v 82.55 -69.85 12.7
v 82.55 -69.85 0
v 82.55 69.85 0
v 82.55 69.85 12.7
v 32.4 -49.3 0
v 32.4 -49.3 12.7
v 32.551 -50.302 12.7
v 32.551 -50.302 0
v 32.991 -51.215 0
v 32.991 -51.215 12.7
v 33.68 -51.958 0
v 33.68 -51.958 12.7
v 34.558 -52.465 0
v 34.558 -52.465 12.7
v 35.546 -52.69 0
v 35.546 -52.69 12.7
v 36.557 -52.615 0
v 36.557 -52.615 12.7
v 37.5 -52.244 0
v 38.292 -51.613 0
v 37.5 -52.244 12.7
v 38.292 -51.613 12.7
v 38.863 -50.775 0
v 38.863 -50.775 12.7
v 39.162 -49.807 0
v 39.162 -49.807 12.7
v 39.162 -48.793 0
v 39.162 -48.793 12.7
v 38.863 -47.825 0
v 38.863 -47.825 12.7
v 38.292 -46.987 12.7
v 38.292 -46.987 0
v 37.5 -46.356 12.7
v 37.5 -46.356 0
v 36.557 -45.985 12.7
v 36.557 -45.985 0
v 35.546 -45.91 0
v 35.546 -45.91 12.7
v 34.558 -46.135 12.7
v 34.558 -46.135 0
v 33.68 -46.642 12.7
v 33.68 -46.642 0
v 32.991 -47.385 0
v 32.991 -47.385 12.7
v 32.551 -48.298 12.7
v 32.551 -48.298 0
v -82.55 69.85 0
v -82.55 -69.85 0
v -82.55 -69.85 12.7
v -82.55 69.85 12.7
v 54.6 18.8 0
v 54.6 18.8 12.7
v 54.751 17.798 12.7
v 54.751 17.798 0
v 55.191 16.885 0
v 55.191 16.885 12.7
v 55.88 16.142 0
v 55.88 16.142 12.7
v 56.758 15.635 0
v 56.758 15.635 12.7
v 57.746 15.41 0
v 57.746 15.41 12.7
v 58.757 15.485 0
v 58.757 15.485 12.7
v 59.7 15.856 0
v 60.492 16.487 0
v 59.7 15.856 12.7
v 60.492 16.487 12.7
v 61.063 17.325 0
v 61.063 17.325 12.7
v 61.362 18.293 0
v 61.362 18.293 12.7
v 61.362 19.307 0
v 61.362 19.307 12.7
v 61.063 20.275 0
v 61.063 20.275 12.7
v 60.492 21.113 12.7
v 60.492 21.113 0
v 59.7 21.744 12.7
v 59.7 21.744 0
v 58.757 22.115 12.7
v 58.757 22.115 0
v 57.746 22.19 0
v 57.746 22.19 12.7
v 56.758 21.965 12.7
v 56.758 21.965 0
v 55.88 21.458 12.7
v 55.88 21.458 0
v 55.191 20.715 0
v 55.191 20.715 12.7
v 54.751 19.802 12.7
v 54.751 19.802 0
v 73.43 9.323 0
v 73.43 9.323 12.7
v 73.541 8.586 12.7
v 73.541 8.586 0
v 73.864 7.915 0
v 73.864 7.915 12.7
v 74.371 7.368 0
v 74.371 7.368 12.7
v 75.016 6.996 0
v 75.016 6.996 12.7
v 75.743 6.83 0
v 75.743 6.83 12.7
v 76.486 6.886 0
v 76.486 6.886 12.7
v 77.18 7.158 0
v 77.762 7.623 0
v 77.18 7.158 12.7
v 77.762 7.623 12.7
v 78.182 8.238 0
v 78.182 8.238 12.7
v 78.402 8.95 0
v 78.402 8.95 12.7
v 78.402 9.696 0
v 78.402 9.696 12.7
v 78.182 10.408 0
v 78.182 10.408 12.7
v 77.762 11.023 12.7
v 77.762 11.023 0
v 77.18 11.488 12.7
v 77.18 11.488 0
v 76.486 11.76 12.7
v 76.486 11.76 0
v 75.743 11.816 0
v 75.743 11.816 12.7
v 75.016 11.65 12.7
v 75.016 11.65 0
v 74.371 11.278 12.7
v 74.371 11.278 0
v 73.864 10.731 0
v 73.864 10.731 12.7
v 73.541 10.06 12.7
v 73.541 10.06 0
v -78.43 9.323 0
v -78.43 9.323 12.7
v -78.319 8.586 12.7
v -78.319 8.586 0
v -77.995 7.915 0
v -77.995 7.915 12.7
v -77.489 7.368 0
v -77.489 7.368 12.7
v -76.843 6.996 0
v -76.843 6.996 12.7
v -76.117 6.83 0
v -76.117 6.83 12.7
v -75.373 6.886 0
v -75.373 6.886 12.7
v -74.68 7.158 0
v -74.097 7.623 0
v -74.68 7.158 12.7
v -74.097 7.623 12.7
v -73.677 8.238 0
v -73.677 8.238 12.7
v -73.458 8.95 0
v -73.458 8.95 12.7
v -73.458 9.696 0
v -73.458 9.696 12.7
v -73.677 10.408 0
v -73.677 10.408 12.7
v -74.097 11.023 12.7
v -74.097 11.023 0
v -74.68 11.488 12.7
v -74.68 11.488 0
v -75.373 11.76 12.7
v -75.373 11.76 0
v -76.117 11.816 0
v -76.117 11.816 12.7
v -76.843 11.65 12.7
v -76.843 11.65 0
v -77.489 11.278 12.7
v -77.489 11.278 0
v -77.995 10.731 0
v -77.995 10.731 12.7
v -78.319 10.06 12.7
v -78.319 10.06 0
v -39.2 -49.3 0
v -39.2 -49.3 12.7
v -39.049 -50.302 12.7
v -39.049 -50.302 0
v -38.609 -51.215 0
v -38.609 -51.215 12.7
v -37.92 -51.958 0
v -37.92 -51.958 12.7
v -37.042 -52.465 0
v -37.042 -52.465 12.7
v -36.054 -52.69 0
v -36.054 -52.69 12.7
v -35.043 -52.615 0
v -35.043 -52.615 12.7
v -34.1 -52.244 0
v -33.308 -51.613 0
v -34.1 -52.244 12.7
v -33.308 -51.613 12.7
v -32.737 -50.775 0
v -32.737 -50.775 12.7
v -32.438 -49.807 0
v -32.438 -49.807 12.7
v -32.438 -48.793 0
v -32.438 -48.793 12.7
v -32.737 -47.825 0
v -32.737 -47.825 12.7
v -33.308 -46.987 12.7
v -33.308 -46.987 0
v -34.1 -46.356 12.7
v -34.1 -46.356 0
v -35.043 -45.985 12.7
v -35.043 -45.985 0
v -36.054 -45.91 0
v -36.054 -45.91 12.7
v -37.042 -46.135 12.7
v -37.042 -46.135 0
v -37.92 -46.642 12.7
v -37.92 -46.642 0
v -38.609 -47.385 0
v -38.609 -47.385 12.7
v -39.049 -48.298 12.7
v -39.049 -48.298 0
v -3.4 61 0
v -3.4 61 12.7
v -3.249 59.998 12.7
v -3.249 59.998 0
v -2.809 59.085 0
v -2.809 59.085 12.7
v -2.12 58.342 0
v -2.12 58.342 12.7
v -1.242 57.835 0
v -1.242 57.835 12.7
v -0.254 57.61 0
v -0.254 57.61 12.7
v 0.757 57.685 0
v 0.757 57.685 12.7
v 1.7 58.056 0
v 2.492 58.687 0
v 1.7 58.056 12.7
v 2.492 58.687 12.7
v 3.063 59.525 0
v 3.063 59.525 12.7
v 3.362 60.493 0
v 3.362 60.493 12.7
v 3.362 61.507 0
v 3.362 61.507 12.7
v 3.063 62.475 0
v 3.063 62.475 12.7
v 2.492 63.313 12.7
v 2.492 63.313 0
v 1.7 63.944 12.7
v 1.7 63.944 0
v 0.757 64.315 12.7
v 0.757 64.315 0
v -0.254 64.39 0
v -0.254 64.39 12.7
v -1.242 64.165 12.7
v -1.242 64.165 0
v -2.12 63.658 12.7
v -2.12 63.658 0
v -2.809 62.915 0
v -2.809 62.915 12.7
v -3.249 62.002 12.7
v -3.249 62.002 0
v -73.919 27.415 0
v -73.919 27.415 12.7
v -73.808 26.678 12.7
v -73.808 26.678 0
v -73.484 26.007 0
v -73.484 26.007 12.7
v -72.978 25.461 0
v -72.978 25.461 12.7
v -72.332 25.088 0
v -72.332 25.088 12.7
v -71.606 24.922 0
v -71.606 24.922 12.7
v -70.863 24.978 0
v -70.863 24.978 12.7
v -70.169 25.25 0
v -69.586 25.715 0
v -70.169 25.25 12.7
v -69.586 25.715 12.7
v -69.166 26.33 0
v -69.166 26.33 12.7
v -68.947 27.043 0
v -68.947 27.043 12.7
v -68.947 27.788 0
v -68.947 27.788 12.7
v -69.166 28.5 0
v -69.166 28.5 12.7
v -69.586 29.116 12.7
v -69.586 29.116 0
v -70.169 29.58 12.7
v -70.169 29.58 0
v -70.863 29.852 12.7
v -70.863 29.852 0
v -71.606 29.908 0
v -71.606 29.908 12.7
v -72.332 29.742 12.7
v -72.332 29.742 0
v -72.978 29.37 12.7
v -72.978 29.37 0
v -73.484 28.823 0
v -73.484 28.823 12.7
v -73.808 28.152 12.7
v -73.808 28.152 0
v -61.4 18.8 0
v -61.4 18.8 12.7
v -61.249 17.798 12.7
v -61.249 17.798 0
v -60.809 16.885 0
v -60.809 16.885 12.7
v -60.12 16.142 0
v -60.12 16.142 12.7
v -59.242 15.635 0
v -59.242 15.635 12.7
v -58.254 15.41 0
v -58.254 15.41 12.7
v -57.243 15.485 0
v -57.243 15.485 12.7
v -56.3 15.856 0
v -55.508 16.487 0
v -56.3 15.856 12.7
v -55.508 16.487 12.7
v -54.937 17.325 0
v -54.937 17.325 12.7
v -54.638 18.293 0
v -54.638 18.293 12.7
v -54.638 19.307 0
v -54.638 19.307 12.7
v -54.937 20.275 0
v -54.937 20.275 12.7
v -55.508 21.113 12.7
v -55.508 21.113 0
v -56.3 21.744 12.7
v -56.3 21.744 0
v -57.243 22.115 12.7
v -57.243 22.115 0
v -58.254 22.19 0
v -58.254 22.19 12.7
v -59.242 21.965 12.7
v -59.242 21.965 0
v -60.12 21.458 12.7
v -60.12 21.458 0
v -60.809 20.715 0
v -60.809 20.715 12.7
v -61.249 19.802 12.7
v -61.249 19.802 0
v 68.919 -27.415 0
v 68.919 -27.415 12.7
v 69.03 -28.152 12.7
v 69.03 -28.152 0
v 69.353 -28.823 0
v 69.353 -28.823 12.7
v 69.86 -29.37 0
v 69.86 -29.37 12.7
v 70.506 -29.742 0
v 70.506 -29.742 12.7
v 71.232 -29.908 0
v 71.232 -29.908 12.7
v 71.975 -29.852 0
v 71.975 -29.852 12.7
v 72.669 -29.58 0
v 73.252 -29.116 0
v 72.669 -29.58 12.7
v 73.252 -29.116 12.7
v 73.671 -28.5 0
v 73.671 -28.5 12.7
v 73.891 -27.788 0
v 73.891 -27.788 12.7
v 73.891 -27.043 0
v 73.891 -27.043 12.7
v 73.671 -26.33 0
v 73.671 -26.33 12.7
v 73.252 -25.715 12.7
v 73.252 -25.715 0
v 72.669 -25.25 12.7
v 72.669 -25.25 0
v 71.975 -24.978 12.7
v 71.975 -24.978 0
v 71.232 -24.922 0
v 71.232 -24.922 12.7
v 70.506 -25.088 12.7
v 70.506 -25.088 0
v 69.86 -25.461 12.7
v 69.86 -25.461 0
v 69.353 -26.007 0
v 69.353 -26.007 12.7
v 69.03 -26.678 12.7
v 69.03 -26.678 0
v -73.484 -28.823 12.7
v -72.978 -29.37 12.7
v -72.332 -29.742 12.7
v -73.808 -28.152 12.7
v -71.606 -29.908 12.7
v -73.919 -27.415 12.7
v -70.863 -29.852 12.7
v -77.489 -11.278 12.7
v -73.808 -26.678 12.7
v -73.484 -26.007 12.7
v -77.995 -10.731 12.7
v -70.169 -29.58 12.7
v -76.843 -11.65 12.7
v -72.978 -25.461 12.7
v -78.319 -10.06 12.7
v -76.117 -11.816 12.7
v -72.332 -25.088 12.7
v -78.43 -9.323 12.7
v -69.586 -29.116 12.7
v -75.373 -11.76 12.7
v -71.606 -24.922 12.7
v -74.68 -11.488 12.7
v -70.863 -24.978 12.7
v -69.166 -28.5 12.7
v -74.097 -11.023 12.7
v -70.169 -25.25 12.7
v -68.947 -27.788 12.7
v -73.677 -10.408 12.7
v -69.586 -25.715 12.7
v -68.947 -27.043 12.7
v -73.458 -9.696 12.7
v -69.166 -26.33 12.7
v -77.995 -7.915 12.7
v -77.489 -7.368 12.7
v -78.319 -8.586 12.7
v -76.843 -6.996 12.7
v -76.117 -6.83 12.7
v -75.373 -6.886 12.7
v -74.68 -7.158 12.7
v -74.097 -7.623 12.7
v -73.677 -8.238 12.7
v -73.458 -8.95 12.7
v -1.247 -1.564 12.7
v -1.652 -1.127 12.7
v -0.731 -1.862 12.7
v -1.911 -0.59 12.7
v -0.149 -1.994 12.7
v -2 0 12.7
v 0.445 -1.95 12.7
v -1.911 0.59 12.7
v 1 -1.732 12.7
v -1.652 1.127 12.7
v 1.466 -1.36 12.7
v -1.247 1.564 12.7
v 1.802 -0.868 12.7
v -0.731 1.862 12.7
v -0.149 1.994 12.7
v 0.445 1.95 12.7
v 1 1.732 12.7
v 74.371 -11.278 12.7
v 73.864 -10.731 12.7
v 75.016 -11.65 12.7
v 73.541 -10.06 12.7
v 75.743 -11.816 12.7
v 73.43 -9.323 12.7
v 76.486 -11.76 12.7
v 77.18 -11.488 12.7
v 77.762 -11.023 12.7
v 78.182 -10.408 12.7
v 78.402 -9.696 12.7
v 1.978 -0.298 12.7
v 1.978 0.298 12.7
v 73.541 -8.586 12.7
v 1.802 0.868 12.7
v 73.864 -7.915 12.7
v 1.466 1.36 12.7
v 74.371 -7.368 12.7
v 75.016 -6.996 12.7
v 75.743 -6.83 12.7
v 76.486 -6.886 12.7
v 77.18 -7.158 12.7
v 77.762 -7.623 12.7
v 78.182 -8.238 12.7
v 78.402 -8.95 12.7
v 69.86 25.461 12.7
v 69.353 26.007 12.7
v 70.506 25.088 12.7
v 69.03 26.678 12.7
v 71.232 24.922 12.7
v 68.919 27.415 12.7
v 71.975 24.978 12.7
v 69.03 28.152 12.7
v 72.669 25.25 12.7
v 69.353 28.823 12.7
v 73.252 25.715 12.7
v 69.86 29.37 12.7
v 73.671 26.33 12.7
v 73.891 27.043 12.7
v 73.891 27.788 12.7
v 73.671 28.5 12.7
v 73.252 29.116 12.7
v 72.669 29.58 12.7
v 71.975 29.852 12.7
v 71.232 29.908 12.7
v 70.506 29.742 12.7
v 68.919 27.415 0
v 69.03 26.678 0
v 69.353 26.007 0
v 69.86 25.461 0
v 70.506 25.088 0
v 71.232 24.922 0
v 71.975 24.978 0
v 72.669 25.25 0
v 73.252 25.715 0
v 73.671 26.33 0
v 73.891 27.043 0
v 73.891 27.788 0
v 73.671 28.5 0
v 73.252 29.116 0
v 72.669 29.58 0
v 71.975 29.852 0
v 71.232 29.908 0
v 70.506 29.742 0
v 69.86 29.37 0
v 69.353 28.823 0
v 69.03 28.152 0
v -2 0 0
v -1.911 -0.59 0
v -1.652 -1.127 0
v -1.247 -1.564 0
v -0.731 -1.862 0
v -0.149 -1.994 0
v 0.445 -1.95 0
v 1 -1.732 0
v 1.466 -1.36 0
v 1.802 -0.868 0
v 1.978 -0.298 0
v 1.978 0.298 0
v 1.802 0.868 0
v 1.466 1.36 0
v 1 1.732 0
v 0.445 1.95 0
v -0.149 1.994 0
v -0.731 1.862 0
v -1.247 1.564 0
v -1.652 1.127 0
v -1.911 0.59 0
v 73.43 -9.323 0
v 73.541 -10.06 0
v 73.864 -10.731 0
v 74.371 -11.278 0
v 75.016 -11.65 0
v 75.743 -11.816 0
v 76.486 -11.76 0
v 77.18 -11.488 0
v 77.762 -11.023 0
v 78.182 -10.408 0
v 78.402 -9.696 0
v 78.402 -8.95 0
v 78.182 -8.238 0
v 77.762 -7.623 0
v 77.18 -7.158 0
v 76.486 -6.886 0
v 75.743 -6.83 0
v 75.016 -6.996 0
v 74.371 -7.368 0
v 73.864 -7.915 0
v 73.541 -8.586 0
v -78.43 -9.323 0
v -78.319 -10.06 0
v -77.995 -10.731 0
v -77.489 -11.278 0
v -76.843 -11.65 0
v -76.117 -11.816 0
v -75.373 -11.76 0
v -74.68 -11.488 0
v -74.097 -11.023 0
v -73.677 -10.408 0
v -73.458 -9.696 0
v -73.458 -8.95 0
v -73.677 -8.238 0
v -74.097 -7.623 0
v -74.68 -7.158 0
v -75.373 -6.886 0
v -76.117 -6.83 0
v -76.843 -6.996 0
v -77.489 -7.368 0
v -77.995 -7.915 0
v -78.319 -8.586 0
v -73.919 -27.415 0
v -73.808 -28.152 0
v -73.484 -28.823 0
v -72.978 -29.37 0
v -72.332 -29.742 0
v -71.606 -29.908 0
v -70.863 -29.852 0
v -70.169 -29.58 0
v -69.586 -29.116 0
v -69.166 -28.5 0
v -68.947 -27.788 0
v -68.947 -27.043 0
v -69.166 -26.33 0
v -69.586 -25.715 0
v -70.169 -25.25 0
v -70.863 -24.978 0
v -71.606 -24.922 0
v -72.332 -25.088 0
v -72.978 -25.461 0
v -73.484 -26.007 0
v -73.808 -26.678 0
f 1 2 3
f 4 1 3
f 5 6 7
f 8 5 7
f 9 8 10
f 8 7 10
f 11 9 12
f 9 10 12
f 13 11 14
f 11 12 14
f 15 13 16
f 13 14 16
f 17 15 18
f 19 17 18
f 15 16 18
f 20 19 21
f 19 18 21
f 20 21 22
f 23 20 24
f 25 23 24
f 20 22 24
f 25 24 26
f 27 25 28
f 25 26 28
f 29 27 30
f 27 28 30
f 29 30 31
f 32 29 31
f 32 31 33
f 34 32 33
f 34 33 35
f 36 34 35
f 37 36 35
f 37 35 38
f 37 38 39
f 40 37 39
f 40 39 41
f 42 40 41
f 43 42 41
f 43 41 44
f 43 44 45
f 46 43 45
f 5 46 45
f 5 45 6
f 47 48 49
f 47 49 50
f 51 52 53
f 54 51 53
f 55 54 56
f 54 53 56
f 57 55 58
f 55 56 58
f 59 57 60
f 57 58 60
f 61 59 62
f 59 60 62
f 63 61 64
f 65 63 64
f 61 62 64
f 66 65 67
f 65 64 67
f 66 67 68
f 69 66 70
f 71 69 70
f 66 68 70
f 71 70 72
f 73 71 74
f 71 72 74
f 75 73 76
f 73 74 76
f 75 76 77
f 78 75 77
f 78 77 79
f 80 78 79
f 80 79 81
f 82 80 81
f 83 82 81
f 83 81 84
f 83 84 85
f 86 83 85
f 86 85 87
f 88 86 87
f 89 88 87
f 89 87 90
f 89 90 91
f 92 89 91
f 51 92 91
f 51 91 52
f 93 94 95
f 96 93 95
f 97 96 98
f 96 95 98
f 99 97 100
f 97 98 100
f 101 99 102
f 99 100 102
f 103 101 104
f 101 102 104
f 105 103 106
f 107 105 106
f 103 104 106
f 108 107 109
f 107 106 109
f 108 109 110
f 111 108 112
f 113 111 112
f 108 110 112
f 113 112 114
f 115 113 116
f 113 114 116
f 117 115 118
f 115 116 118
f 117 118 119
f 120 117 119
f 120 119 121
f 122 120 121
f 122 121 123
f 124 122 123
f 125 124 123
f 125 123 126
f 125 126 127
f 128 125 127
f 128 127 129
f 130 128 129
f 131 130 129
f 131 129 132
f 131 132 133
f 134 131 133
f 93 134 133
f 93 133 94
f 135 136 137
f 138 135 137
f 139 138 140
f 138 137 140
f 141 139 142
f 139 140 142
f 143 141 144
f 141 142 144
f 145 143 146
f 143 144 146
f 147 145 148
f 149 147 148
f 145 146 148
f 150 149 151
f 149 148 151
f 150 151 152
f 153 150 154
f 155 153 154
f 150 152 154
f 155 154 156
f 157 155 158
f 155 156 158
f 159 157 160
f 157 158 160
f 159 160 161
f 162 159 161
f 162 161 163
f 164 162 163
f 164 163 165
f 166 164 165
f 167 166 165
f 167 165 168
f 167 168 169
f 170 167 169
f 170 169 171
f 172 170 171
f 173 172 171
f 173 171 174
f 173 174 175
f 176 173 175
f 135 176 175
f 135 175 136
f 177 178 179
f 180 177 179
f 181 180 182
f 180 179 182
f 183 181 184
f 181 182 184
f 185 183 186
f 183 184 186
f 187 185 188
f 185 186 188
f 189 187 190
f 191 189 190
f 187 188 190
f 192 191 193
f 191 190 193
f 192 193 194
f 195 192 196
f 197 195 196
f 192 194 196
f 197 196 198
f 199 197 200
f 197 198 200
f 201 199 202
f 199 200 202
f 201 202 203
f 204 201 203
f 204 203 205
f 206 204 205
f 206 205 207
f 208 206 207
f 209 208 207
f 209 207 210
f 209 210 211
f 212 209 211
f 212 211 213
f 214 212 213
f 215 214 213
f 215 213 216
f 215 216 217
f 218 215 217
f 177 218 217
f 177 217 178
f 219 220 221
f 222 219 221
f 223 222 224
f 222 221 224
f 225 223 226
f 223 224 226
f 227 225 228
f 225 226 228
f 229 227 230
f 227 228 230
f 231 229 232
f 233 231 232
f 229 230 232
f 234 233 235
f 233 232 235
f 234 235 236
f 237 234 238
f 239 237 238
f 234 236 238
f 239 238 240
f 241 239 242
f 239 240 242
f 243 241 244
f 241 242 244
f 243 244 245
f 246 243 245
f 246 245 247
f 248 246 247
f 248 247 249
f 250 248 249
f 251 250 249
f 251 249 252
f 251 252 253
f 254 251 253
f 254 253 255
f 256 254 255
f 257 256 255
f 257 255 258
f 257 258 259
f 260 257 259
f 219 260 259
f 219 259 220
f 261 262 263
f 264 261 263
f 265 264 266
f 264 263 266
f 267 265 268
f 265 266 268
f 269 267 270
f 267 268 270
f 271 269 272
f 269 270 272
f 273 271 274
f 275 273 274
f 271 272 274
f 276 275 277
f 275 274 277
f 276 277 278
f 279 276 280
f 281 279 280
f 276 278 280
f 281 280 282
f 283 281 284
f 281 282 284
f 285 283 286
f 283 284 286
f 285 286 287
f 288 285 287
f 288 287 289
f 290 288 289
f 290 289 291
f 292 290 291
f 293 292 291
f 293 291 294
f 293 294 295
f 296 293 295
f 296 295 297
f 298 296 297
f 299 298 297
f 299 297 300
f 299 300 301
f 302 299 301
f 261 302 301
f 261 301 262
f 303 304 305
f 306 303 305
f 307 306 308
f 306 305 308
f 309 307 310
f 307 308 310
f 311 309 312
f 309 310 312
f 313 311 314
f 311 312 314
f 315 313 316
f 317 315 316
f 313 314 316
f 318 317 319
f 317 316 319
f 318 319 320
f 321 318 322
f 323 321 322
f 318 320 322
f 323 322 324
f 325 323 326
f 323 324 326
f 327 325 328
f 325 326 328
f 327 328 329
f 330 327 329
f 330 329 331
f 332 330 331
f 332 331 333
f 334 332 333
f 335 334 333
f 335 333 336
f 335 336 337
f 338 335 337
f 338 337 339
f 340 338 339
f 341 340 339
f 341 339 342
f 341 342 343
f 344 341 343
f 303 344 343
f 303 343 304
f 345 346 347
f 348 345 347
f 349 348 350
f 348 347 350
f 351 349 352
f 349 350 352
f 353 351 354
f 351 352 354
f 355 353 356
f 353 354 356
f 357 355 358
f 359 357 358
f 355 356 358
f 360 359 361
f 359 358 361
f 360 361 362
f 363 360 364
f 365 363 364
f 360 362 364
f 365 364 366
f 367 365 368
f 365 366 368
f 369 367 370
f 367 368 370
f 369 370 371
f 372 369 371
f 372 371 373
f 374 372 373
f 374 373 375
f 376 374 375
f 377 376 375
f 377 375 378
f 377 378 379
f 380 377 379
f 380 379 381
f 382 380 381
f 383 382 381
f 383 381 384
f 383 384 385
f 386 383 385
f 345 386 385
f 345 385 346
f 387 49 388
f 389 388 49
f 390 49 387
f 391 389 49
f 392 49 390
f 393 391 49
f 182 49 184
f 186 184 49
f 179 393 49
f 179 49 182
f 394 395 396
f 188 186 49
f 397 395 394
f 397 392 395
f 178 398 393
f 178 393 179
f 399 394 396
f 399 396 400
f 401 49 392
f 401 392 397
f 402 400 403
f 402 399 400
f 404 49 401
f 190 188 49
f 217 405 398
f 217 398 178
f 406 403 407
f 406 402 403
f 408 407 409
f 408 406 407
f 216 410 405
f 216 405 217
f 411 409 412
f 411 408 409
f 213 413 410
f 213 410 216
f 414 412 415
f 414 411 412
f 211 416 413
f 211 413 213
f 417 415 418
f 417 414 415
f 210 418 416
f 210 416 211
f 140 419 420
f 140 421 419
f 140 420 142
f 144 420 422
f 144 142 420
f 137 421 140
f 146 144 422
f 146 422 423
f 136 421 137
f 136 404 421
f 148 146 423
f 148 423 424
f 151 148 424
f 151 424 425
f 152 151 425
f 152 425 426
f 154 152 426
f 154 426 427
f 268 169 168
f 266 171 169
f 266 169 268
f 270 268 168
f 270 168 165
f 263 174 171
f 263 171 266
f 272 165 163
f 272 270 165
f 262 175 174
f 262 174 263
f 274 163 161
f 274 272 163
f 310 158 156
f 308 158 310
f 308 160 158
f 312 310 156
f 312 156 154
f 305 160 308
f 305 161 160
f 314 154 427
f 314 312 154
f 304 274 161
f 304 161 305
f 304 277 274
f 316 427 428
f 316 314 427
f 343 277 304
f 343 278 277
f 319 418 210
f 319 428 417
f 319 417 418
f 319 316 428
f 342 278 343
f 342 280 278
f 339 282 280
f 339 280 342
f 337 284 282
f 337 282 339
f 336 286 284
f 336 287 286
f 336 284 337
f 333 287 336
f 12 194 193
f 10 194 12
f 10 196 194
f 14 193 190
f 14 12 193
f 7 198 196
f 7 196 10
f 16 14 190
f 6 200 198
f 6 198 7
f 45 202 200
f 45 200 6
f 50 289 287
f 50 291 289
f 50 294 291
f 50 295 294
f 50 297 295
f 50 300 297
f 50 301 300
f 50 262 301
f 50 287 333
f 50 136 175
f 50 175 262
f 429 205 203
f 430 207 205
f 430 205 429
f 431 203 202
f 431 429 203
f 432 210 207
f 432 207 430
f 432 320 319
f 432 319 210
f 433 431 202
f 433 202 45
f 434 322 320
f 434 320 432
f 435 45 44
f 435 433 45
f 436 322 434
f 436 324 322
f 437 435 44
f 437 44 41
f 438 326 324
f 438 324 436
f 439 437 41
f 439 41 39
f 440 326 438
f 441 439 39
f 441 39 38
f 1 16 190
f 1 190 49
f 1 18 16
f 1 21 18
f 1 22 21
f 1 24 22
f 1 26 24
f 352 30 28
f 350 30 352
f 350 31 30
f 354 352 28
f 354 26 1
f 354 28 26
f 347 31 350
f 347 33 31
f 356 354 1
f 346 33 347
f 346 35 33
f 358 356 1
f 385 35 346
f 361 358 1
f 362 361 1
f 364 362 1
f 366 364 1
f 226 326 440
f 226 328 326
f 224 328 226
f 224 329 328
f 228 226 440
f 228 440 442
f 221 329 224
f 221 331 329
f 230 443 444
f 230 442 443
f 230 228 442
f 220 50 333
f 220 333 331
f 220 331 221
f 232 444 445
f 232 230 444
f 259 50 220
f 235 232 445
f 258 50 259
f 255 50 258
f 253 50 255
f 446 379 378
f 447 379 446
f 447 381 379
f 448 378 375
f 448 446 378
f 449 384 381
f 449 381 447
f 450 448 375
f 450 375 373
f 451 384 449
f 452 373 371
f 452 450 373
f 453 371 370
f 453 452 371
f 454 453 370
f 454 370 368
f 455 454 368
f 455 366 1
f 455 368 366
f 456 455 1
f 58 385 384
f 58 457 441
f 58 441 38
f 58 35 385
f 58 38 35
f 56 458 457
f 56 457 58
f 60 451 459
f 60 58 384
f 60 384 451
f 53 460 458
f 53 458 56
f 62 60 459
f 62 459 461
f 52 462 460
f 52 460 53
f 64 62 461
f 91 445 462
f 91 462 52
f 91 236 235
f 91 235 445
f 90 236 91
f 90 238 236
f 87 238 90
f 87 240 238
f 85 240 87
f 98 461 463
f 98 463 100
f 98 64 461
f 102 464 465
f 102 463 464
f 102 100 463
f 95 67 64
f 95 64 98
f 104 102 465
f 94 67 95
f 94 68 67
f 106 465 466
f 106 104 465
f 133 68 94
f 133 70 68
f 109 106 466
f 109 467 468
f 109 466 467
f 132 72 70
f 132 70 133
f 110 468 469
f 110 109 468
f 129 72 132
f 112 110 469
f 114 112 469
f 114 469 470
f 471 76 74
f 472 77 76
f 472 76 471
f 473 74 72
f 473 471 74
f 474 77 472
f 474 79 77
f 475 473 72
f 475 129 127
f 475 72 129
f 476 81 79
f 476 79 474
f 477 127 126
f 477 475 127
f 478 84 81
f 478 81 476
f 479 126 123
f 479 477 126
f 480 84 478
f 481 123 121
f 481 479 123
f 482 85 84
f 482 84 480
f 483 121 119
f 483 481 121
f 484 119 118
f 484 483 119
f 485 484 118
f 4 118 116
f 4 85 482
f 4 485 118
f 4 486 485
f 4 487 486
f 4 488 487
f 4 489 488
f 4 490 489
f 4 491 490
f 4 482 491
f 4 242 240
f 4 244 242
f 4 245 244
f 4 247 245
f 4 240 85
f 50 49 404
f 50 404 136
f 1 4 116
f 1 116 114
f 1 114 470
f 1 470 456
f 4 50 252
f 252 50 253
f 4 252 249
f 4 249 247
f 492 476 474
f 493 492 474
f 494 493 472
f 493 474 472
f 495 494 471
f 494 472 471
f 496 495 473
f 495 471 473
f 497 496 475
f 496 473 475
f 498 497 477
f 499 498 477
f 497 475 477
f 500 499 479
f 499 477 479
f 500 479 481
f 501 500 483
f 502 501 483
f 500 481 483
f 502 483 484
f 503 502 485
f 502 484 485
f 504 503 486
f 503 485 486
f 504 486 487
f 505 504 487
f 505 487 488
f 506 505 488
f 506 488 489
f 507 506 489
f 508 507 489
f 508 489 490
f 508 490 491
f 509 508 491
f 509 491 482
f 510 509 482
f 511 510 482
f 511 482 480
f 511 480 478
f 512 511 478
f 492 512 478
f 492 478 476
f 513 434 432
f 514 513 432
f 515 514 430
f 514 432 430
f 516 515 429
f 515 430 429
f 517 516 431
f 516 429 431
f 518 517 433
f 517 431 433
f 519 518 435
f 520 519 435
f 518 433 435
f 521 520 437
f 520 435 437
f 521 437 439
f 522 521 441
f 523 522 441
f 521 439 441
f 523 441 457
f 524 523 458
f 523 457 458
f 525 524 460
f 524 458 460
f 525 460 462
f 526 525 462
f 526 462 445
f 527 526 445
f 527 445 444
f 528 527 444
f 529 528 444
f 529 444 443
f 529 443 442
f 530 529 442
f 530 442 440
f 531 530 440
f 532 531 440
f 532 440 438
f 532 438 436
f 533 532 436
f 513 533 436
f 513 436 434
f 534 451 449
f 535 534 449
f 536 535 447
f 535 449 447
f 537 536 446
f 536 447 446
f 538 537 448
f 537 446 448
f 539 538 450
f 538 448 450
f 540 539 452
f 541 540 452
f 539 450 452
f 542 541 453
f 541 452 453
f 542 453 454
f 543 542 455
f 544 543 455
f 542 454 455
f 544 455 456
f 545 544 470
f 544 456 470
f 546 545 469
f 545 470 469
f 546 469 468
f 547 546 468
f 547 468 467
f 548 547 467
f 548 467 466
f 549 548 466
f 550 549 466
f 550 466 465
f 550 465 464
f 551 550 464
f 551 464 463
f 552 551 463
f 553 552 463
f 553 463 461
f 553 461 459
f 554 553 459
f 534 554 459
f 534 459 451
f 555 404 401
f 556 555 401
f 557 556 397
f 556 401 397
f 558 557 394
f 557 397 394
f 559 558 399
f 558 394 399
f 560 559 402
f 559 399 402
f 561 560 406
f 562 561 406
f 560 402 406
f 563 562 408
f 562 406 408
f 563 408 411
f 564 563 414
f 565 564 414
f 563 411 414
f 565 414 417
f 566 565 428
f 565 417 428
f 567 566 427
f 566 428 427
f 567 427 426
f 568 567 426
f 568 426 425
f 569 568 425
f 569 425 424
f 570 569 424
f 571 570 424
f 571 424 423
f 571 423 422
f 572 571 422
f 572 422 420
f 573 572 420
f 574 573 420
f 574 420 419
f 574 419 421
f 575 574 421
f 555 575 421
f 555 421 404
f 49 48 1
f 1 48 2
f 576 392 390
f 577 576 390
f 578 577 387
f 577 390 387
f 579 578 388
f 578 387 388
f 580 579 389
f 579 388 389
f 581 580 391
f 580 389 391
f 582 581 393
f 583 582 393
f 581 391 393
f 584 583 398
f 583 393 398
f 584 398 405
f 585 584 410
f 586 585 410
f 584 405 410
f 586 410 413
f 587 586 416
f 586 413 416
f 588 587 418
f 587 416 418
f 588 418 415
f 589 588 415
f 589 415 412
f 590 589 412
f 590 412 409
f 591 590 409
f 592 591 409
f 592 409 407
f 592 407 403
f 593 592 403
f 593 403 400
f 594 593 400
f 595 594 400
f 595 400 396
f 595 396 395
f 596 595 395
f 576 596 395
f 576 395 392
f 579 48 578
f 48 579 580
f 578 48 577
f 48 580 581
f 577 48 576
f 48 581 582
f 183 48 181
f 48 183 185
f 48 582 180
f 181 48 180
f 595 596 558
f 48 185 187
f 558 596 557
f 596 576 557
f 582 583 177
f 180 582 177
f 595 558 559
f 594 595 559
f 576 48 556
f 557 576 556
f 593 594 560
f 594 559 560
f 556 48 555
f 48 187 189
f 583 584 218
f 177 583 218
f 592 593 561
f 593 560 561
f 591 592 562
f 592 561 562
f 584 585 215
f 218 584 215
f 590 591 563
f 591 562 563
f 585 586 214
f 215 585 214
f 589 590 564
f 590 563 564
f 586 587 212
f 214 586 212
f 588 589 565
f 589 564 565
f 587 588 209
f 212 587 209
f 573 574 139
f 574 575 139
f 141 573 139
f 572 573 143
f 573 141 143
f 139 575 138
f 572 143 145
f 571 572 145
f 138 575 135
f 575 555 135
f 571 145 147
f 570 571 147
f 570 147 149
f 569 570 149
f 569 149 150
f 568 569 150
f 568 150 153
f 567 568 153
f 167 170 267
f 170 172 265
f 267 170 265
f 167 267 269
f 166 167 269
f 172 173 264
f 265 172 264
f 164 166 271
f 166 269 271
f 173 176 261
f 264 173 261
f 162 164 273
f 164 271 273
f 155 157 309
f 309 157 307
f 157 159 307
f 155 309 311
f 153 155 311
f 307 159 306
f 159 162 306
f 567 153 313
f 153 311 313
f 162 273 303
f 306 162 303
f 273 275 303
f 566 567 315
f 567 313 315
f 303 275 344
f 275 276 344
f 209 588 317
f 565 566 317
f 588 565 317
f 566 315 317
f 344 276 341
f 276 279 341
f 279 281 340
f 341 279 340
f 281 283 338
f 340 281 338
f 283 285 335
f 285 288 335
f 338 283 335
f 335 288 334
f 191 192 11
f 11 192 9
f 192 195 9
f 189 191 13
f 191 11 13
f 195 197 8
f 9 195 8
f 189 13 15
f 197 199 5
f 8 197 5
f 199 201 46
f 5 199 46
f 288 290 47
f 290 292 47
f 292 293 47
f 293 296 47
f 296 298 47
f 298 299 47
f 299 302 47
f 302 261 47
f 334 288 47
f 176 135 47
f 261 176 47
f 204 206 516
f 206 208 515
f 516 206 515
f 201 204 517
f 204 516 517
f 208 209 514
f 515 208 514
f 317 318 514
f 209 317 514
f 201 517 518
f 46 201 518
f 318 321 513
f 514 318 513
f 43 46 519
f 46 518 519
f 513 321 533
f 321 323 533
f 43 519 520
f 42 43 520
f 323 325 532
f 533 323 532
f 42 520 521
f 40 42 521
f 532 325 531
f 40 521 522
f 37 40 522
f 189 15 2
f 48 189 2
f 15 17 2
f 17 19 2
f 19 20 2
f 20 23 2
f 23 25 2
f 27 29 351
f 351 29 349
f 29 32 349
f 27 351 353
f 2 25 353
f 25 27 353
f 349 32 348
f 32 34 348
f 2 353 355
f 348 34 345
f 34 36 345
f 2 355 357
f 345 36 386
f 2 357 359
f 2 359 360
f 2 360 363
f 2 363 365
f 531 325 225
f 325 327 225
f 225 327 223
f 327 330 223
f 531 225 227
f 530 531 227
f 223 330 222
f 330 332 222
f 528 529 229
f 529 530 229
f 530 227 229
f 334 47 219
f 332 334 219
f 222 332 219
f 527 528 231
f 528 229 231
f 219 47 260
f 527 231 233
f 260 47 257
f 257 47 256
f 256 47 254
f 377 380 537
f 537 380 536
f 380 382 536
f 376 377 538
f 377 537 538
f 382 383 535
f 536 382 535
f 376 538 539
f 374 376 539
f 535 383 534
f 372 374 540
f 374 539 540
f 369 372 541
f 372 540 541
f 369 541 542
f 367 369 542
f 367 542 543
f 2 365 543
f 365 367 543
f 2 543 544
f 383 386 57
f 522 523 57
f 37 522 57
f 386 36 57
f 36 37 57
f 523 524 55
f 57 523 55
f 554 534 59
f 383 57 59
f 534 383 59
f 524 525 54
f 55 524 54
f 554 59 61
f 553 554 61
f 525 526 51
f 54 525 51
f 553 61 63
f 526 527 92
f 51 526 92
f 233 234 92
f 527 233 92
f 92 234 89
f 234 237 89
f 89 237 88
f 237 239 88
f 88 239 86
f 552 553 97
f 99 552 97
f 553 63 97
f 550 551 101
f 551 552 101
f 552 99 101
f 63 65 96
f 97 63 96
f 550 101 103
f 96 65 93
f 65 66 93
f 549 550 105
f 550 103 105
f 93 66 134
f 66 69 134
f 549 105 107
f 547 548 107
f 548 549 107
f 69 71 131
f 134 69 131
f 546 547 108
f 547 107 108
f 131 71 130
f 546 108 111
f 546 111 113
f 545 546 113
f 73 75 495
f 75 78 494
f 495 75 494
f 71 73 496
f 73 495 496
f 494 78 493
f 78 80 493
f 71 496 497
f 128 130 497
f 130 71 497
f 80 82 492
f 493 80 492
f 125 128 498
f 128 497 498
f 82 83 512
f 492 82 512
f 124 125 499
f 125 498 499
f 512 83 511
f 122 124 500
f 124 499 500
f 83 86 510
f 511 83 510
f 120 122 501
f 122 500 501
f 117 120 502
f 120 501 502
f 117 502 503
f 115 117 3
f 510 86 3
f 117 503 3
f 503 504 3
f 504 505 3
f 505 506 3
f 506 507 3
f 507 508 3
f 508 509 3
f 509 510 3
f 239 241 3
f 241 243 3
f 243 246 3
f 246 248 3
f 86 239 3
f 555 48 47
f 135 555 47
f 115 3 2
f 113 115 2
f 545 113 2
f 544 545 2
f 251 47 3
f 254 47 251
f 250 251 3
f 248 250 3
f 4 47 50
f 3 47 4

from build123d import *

# Parameters (mm, degrees)
F0_W     = 165.1
F0_H     = 139.7
F1_DEPTH = 12.7
F2_D     = 6.8
F3_D     = 5
F4_D     = 4


with BuildPart() as f1:
    # F0 (on Top) → F1 (new body)
    with BuildSketch(Plane.XY):
        Rectangle(F0_W, F0_H)
    extrude(amount=F1_DEPTH)

    # F2 (through all)
    with Locations(Plane(origin=(0, 0, 0), x_dir=(1, 0, 0), z_dir=(0, 0, -1))):
        with Locations((-58, -18.8), (0, -61), (58, -18.8), (35.8, 49.3), (-35.8, 49.3)):
            Hole(F2_D / 2)

    # F3 (through all)
    with Locations(Plane(origin=(0, 0, 0), x_dir=(1, 0, 0), z_dir=(0, 0, -1))):
        with Locations((-71.418902627, 27.4151481402), (-75.9297806006, 9.3230047705), (-75.9297806006, -9.3230047705), (-71.418902627, -27.4151481402), (71.418902627, 27.4151481402), (75.9297806006, 9.3230047705), (75.9297806006, -9.3230047705), (71.418902627, -27.4151481402)):
            Hole(F3_D / 2)

    # F4 (through all)
    with Locations(Plane(origin=(0, 0, 0), x_dir=(1, 0, 0), z_dir=(0, 0, -1))):
        with Locations((0, 0)):
            Hole(F4_D / 2)


solid = f1.part
